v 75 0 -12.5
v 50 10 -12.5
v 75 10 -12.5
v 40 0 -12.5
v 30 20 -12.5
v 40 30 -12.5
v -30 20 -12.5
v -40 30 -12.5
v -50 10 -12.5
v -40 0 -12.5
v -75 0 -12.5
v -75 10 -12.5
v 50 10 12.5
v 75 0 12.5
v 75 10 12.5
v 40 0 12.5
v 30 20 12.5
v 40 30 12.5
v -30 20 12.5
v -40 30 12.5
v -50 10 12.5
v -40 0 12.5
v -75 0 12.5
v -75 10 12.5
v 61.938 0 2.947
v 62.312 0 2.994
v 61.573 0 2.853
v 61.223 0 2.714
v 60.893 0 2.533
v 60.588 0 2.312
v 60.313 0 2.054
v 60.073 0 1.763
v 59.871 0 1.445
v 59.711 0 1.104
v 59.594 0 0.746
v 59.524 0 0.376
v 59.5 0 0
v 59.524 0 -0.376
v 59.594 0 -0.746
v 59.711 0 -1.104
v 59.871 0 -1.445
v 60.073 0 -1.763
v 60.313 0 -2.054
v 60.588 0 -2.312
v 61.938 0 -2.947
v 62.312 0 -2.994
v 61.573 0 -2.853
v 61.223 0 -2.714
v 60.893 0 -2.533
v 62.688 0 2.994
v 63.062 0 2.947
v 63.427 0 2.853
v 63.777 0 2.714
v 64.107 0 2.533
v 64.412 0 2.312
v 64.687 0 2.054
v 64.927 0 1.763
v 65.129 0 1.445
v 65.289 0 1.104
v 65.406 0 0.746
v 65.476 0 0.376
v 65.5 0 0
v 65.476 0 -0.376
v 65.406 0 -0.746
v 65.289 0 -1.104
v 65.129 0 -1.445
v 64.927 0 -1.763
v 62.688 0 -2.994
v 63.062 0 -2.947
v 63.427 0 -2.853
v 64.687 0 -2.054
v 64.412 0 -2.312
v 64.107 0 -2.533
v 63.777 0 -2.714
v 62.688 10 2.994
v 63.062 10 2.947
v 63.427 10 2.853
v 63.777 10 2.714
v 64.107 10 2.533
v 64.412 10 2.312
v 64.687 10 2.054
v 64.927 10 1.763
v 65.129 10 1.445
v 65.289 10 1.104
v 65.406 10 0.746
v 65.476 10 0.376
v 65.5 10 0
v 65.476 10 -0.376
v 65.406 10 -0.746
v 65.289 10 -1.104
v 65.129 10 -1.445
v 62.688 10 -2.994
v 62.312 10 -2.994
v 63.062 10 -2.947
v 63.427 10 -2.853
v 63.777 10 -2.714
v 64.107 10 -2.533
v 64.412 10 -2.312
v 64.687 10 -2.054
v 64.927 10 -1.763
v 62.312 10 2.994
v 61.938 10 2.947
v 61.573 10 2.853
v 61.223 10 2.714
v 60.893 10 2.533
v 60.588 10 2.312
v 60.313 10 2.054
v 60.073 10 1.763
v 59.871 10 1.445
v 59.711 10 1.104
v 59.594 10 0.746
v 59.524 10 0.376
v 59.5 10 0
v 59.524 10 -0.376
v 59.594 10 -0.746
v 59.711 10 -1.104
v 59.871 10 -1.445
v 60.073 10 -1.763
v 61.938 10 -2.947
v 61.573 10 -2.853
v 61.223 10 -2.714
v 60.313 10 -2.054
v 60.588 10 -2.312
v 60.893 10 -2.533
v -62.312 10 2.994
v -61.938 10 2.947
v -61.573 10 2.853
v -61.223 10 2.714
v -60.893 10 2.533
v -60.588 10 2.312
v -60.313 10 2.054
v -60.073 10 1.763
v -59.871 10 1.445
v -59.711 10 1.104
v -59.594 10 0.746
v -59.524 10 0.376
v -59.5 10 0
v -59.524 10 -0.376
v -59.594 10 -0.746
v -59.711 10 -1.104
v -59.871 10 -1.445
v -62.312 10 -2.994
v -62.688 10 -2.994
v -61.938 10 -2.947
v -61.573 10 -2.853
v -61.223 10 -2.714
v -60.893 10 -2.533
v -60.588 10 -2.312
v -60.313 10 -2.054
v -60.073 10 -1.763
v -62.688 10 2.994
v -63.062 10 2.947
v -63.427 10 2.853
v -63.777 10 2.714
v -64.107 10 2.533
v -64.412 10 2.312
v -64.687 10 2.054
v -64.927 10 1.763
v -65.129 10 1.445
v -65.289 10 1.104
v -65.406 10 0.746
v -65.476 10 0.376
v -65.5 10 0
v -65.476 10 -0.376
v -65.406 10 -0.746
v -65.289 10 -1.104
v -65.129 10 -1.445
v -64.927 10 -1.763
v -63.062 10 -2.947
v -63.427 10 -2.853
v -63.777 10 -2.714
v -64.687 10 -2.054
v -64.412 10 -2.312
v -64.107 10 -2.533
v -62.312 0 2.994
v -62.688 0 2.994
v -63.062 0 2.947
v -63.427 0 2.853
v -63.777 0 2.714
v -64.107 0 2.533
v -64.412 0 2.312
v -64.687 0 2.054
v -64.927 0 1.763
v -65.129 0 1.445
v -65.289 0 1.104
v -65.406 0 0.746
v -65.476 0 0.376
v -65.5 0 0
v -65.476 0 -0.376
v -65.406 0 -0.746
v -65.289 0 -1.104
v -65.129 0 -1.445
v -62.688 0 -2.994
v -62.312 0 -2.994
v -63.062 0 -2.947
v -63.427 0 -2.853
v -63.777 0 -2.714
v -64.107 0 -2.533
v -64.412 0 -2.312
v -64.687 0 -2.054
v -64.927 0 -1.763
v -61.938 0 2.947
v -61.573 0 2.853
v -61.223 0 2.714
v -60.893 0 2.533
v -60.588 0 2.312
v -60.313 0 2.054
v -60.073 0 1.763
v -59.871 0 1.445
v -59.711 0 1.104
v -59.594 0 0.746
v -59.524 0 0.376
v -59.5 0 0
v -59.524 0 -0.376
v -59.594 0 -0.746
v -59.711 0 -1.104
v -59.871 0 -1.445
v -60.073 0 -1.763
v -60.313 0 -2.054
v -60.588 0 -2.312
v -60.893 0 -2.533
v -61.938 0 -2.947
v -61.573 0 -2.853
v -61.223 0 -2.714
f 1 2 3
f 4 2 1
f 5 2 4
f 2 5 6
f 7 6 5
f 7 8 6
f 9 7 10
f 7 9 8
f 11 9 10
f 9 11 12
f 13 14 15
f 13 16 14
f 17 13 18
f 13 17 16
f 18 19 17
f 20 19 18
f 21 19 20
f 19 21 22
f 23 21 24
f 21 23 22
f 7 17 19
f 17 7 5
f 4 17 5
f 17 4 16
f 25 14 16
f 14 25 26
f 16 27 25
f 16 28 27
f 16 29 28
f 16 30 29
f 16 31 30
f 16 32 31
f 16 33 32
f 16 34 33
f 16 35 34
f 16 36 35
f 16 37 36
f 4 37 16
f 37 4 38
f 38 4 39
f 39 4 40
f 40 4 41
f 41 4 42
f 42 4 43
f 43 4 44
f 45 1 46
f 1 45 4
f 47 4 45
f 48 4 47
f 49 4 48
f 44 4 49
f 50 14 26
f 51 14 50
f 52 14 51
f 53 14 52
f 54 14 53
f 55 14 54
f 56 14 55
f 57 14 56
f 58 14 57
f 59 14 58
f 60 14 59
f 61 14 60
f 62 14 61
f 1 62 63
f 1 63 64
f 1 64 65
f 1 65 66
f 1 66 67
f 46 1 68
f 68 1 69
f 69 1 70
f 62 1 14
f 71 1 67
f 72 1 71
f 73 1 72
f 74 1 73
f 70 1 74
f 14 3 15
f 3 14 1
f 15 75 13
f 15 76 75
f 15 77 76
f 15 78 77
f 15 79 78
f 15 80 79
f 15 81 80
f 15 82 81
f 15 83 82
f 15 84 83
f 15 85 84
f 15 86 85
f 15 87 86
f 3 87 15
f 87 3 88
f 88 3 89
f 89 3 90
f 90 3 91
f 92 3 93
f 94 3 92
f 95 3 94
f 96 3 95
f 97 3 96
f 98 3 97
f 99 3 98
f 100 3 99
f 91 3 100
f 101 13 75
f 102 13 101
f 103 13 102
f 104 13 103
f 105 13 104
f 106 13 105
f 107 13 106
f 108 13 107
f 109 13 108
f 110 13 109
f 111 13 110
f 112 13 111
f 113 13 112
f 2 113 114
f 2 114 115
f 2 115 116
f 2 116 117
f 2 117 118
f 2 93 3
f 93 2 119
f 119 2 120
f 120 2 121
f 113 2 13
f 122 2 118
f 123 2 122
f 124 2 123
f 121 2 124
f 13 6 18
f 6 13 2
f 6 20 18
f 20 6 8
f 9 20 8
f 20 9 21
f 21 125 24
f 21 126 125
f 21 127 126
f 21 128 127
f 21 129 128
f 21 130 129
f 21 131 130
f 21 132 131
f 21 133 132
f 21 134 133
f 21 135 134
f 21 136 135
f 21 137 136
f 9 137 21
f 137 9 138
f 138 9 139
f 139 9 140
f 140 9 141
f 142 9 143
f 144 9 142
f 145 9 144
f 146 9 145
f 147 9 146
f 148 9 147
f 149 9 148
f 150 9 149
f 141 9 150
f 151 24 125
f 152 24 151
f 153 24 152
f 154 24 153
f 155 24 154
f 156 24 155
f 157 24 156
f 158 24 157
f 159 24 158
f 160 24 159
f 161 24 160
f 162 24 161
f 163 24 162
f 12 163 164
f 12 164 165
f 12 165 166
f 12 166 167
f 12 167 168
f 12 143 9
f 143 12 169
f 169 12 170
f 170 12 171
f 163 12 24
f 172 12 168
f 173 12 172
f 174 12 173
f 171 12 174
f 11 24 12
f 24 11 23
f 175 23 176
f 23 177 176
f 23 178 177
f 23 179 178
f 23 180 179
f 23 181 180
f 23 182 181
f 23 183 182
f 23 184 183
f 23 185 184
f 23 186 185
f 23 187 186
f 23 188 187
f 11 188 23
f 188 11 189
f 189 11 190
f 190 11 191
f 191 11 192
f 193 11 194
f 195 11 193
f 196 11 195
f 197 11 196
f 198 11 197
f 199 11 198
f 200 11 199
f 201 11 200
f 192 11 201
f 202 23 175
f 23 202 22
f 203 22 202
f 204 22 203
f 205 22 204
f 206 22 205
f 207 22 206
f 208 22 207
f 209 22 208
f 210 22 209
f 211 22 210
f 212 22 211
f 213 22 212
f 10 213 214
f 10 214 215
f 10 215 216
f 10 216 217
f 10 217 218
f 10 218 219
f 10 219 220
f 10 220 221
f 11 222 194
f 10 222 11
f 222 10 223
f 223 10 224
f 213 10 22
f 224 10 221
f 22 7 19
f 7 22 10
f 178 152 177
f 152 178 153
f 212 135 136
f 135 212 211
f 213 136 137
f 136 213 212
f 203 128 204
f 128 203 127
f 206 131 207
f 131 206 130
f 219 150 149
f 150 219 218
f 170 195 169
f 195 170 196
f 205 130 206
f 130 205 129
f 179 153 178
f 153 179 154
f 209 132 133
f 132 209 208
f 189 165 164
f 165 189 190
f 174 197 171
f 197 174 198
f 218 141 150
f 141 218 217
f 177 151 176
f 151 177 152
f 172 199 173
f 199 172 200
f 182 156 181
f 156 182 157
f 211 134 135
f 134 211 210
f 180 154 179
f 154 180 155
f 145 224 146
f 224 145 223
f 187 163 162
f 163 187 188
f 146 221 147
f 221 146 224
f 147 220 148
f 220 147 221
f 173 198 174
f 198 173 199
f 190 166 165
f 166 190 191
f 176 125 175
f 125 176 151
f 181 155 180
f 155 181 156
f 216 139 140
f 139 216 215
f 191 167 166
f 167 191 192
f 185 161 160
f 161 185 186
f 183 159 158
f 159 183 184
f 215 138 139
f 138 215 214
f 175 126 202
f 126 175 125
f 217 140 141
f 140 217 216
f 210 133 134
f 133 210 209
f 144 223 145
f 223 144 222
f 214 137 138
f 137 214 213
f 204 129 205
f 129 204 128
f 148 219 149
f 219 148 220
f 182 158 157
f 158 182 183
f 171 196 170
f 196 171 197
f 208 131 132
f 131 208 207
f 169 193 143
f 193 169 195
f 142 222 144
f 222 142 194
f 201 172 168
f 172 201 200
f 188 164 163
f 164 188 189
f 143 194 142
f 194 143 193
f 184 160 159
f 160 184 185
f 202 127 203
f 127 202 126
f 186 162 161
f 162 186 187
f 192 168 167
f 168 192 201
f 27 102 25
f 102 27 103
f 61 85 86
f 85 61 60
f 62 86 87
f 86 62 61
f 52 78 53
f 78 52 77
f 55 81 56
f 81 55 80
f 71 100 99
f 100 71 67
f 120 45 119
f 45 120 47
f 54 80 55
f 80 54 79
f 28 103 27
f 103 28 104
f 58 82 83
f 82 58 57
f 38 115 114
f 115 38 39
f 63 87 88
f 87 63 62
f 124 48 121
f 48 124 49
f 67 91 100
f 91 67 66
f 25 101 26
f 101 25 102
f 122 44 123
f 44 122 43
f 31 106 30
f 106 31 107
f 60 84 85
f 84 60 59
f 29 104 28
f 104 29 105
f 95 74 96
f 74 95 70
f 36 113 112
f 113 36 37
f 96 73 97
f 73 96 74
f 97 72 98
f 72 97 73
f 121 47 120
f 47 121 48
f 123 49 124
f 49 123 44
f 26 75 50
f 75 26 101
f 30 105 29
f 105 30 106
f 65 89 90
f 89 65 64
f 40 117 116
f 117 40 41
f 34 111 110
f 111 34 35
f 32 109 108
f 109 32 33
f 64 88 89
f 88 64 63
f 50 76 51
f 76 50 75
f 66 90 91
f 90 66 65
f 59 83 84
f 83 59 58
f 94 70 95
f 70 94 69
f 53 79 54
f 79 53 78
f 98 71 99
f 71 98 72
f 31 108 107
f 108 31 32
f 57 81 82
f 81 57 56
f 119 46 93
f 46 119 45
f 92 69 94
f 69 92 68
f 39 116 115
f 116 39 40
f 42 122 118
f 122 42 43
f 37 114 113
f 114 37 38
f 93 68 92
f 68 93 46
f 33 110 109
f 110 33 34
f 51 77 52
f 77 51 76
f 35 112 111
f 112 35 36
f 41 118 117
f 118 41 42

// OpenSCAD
$fn = 50;

thickness_near_screw = 10;
length_near_screw = 25;
thickness_near_angle = 10;
thickness_near_top = 10;
height = 30;
width = 25;
overall_length = 150;
top_length = 80;
screw_diameter = 6;

translate([-overall_length/2, 0, 0])
difference() {
  linear_extrude(width, center = true) {
    polygon([
      [0, 0],
      [0, thickness_near_screw],
      [length_near_screw, thickness_near_screw],
      [length_near_screw + (overall_length - top_length - (length_near_screw * 2))/2, height],
      [length_near_screw + (overall_length - top_length - (length_near_screw * 2))/2 + top_length, height],
      [overall_length - length_near_screw, thickness_near_screw],
      [overall_length, thickness_near_screw],
      [overall_length, 0],
      [overall_length - length_near_screw - thickness_near_angle, 0],
      [length_near_screw + (overall_length - top_length - (length_near_screw * 2))/2 + top_length - thickness_near_top, height - thickness_near_top],
      [length_near_screw + (overall_length - top_length - (length_near_screw * 2))/2 + thickness_near_top, height - thickness_near_top],
      [length_near_screw + thickness_near_angle, 0]
      ]);
  };

  rotate([90, 0, 0])
  translate([length_near_screw / 2, 0, 0])
  cylinder(d = screw_diameter, h = thickness_near_screw * 3, center = true);

  rotate([90, 0, 0])
  translate([overall_length - length_near_screw / 2, 0, 0])
  cylinder(d = screw_diameter, h = thickness_near_screw * 3, center = true);
}
